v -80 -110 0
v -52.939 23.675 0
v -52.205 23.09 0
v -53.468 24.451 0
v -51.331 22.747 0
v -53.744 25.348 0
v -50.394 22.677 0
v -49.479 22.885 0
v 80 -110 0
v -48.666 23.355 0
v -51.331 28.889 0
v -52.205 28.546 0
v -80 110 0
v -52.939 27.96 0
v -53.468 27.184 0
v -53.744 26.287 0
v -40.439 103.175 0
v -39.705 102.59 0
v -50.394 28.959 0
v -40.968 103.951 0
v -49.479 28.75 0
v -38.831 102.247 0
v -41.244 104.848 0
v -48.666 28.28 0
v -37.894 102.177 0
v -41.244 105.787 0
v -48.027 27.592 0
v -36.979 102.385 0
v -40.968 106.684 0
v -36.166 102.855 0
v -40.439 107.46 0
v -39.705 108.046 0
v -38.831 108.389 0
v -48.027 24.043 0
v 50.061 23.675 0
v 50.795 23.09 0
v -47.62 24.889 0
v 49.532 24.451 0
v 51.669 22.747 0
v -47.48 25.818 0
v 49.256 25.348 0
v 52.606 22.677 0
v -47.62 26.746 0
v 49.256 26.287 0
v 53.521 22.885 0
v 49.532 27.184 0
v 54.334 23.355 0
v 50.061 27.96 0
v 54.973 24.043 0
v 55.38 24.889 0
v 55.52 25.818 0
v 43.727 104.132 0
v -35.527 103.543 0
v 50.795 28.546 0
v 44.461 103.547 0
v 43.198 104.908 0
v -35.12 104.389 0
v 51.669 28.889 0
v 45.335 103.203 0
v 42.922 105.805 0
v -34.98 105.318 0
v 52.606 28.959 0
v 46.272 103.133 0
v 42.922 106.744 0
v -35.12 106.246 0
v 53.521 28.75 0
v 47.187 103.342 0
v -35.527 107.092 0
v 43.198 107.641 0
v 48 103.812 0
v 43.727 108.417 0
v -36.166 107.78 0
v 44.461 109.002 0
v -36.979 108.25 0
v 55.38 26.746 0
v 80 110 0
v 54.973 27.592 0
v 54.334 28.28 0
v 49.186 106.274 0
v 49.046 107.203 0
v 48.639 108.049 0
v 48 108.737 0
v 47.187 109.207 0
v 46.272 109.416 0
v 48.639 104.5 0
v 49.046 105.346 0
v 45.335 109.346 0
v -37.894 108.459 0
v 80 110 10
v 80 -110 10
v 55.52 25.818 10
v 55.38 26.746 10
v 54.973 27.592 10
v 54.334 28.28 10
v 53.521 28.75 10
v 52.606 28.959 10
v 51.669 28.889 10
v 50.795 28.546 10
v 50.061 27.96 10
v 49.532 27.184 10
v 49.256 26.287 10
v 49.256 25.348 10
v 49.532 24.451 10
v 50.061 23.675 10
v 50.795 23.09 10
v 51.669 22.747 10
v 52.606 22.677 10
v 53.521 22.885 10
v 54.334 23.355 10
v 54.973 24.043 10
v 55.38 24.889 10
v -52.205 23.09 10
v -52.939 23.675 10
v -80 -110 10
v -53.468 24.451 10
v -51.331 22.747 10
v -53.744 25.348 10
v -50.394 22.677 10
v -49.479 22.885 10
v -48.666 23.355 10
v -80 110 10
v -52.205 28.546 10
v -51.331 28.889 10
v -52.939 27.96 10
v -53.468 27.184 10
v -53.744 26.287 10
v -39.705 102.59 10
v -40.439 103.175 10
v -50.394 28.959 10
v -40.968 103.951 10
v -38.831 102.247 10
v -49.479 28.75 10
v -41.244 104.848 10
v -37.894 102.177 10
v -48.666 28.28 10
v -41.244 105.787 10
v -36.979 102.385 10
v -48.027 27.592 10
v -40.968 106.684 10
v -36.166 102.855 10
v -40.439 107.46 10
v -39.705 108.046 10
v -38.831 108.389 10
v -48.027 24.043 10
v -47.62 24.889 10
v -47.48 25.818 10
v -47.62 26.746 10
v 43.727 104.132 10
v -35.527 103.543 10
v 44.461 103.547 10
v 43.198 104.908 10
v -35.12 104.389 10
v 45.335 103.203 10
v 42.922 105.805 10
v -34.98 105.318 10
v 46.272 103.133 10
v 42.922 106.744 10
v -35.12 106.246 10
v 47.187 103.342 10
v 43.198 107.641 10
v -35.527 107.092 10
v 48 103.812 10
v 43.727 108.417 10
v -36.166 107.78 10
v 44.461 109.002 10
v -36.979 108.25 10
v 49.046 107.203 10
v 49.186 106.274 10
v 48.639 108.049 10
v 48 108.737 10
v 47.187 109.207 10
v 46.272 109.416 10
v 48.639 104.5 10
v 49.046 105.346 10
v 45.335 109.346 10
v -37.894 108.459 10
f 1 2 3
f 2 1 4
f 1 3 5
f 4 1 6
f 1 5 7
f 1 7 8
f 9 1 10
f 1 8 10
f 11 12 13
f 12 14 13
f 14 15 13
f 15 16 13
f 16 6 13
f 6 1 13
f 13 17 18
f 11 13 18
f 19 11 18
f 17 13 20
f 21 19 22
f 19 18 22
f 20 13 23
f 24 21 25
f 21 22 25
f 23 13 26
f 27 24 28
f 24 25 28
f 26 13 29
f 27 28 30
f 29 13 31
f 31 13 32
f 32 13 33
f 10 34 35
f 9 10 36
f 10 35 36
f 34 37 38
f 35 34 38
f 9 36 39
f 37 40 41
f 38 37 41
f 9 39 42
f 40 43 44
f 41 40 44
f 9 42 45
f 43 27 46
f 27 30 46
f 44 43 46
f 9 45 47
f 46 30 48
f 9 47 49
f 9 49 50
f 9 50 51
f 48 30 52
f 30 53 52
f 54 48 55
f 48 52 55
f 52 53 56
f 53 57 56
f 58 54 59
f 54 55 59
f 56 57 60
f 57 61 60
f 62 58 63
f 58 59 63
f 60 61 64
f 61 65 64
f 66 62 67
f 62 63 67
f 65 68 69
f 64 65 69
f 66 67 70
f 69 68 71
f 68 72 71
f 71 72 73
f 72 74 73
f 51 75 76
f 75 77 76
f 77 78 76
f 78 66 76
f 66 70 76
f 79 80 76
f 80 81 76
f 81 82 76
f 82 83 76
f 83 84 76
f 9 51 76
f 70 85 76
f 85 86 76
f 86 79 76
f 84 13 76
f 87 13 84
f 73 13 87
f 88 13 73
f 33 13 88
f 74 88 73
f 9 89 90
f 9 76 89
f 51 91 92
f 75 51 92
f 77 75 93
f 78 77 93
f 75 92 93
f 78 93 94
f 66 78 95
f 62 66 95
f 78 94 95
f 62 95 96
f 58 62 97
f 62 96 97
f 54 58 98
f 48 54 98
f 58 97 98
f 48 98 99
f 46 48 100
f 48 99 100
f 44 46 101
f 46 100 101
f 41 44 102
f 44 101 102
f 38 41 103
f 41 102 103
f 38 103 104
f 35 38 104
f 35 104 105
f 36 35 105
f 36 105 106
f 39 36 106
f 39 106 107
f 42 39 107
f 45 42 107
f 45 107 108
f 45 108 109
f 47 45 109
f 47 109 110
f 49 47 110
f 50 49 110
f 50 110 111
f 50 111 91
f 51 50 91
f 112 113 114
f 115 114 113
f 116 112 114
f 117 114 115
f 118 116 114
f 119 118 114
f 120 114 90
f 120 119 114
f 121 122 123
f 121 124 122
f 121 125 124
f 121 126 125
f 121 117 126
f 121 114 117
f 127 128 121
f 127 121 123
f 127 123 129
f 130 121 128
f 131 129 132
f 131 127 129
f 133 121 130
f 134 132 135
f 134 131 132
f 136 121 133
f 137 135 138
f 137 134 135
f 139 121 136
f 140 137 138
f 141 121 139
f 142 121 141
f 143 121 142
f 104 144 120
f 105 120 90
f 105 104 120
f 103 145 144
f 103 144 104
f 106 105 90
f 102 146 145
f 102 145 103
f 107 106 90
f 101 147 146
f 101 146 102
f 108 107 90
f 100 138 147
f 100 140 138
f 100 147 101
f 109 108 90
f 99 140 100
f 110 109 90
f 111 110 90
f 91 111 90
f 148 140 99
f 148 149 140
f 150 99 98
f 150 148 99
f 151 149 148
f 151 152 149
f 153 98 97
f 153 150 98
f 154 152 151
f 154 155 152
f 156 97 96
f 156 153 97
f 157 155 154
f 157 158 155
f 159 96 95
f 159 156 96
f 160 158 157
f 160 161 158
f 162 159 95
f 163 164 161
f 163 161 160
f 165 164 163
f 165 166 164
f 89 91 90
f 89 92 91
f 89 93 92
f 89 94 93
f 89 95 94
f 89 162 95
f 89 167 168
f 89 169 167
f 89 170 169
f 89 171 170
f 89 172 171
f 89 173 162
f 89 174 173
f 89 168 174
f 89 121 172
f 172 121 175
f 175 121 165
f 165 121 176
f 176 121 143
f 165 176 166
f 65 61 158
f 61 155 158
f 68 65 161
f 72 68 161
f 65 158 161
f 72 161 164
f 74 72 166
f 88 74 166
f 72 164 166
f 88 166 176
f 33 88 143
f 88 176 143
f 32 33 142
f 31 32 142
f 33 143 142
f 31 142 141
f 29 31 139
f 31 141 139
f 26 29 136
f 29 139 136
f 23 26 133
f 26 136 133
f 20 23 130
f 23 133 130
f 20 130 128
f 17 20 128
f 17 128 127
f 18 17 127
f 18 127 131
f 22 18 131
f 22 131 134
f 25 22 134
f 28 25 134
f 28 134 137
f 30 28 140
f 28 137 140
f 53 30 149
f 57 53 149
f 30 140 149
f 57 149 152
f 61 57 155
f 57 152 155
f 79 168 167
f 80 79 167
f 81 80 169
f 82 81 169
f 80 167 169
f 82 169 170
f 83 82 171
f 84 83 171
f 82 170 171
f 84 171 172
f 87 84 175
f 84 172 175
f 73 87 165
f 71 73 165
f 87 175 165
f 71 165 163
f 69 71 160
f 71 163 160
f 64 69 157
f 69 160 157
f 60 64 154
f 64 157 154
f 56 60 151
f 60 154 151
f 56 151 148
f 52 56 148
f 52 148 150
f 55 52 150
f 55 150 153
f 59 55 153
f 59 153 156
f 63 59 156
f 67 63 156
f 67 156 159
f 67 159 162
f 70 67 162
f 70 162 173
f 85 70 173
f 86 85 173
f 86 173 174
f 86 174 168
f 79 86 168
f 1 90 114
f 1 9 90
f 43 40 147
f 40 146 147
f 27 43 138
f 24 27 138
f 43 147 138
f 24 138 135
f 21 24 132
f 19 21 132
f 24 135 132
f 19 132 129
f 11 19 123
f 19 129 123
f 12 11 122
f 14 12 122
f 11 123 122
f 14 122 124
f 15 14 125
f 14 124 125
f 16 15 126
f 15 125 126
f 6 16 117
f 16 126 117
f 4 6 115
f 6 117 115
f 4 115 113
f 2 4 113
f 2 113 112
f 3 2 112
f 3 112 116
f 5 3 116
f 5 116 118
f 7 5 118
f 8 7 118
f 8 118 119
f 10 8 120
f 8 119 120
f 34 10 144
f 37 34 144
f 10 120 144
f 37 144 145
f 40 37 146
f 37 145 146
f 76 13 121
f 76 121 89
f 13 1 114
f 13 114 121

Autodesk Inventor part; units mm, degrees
ref_plane "YZ Plane" through (0, 0, 0) normal (1, 0, 0) x (0, 1, 0)
ref_plane "XZ Plane" through (0, 0, 0) normal (0, 1, 0) x (-1, 0, 0)
ref_plane "XY Plane" through (0, 0, 0) normal (0, 0, 1) x (1, 0, 0)
sketch "Sketch1" plane through (0, 0, 0) normal (0, 0, 1) x (1, 0, 0)
  line L0 (-80, 110) -> (80, 110)
  line L1 (80, 110) -> (80, -110)
  line L2 (80, -110) -> (-80, -110)
  line L3 (-80, -110) -> (-80, 110)
  point P0 (0, 0)
  point P1 (-80, 0)
  point P2 (0, 110)
  dimension "d0" = 160
  dimension "d1" = 220
extrude "Extrusion1" add sketch "Sketch1" along normal blind 10
sketch "Sketch2" plane through (0, 0, 10) normal (0, 0, 1) x (1, 0, 0)
  circle A0 centre (52.3704, 25.8177) radius 1.7
  circle A1 centre (52.3704, 25.8177) radius 3.15
  circle A2 centre (-50.6296, 25.8177) radius 1.7
  circle A3 centre (-50.6296, 25.8177) radius 3.15
  circle A4 centre (-38.1296, 105.3177) radius 3.15
  circle A5 centre (46.0364, 106.2745) radius 1.7
  circle A6 centre (46.0364, 106.2745) radius 3.15
  circle A7 centre (52.3704, 25.8177) radius 3.15
  circle A8 centre (-50.6296, 25.8177) radius 3.15
  circle A9 centre (-38.1296, 105.3177) radius 3.15
  circle A10 centre (46.0364, 106.2745) radius 3.15
  point P0 (0, 0)
  point P1 (8.7862, 59.2077)
extrude "Extrusion2" cut sketch "Sketch2" against normal up to surface (10 mm away) contours A0 | A1 | A2 | A3 | A4 | A5 | A6
properties part number "sensor bottom"
